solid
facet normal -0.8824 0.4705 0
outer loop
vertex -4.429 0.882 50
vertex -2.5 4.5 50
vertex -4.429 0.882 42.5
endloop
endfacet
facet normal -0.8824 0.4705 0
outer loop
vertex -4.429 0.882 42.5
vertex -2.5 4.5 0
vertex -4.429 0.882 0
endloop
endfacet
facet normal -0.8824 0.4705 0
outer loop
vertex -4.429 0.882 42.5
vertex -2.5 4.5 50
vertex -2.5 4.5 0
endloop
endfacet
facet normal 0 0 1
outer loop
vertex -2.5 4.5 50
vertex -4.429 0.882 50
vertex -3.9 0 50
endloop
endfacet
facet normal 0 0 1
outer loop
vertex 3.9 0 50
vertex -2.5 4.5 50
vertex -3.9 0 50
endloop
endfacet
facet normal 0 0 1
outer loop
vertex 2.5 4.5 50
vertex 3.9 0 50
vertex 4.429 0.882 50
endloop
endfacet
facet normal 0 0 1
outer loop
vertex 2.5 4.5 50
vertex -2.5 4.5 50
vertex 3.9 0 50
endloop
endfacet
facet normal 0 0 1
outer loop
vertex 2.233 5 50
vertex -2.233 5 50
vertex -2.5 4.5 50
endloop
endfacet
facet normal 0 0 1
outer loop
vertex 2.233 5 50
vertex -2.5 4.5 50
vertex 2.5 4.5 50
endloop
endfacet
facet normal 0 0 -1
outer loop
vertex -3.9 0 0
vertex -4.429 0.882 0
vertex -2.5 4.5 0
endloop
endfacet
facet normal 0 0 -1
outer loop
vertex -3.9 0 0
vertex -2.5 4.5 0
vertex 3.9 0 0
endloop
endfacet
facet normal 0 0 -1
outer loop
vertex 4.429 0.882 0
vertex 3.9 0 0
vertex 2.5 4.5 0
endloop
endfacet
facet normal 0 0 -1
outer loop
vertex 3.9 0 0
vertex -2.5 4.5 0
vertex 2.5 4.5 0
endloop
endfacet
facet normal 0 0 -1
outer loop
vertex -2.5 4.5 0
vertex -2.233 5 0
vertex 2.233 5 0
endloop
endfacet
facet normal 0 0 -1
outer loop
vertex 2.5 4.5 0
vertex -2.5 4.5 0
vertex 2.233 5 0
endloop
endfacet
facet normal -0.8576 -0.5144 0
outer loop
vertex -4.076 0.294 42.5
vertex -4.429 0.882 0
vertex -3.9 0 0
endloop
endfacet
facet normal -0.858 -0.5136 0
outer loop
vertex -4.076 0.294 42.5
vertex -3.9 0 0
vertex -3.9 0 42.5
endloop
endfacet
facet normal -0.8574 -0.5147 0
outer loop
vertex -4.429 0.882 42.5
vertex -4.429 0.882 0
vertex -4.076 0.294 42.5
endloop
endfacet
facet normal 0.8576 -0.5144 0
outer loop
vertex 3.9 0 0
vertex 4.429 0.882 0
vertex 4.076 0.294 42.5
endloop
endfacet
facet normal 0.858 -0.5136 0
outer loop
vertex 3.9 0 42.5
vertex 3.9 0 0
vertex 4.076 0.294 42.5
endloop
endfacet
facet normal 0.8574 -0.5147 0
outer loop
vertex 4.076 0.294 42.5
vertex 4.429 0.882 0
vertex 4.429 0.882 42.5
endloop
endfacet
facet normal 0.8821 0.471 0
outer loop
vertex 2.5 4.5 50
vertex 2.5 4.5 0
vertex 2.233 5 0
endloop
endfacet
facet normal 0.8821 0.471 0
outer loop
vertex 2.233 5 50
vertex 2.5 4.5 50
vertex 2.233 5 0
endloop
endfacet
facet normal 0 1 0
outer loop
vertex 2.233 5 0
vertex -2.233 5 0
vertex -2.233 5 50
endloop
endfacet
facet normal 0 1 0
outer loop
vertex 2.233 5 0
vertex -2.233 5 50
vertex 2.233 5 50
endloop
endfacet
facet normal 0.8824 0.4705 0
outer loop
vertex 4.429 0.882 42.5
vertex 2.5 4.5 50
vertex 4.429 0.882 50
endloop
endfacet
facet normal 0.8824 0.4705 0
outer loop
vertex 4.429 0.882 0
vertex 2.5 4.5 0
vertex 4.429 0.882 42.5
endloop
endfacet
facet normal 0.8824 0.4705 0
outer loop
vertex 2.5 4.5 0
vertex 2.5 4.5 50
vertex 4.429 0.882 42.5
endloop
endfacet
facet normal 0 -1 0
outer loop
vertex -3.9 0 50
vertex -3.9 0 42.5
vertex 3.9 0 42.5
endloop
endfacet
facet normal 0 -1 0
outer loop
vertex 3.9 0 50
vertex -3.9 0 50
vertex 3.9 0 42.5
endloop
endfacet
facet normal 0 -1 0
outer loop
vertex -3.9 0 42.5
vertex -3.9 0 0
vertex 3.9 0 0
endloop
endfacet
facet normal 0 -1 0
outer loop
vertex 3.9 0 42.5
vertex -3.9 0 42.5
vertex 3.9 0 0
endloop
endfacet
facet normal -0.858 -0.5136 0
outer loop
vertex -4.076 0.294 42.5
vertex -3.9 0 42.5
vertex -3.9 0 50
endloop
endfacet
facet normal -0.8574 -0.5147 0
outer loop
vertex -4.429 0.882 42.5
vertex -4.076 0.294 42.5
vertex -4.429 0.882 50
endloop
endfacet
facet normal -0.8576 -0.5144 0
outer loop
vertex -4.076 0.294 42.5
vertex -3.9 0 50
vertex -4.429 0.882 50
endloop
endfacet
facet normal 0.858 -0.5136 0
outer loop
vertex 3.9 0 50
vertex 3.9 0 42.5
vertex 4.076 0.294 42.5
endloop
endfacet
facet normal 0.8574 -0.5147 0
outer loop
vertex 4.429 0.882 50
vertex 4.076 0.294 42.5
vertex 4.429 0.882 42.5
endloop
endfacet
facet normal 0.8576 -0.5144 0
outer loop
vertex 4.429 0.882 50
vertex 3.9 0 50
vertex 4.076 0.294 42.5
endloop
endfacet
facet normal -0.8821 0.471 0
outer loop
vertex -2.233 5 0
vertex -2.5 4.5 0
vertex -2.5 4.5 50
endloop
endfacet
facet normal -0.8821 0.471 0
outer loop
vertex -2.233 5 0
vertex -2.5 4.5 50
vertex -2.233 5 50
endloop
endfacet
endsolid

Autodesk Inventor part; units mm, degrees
ref_plane "YZ Plane" through (0, 0, 0) normal (1, 0, 0) x (0, 1, 0)
ref_plane "XZ Plane" through (0, 0, 0) normal (0, 1, 0) x (-1, 0, 0)
ref_plane "XY Plane" through (0, 0, 0) normal (0, 0, 1) x (1, 0, 0)
sketch "Sketch1" plane through (0, 0, 0) normal (0, 0, 1) x (1, 0, 0)
  line L0 (0, 0) -> (-4.9, 0)
  line L1 (-4.9, 0) -> (4.9, 0)
  line L2 (0, 0) -> (0, 5)
  line L3 (0, 5) -> (-2.5, 5)
  line L4 (-2.5, 5) -> (-4.9, 0)
  line L5 (0, 5) -> (2.5, 5)
  line L6 (2.5, 5) -> (4.9, 0)
  line L7 (0, 0) -> (0, 4)
  line L8 (0, 4) -> (-2.5, 4)
  line L9 (-2.5, 4) -> (-4.9, 0)
  line L10 (0, 4) -> (2.5, 4)
  line L11 (2.5, 4) -> (4.9, 0)
  line L12 (0, 4) -> (0, 5)
  line L13 (0, 4.5) -> (-2.5, 4.5)
  line L14 (-2.5, 4.5) -> (-4.9, 0)
  line L15 (0, 4.5) -> (2.5, 4.5)
  line L16 (2.5, 4.5) -> (4.9, 0)
  line L17 (-4.9, 0) -> (-2.2333, 5)
  line L18 (4.9, 0) -> (2.2333, 5)
  dimension "d0" = 4.9
  dimension "d1" = 9.8
  dimension "d5" = 5
  dimension "d6" = 2.5
  dimension "d7" = 2.5
  dimension "d33" = 4
extrude "Extrusion1" add sketch "Sketch1" along normal blind 50 contours L2 L10 L11 L1 | L0 L9 L8 L2 | L14 L13 L2 L8 L9 | L11 L10 L2 L15 L16 | L17 L3 L2 L13 | L15 L2 L5 L18
sketch "Sketch2" plane through (0, 0, 50) normal (0, 0, 1) x (1, 0, 0)
  line L0 (0, 5) -> (0, -65)
  circle A0 centre (0, -30) radius 35
  line L1 (-4.9, 0) -> (4.9, 0) projected
  line L2 (4.9, 0) -> (18.0278, 0)
  arc A1 (18.0278, 0) -> (2.5, 5) centre (2.5, -21.6111) ccw
  line L3 (4.9, 0) -> (0, 0)
  line L4 (2.5, 5) -> (0, 5)
  line L5 (-4.9, 0) -> (-18.0278, 0)
  arc A2 (-2.5, 5) -> (-18.0278, 0) centre (-2.5, -21.6111) ccw
  circle A3 centre (0, -30) radius 37.5
  line L6 (2.5, 6.0566) -> (32.476, -11.25)
  line L7 (32.476, -11.25) -> (32.476, -48.75)
  line L8 (32.476, -48.75) -> (0, -67.5)
  line L9 (0, -67.5) -> (-32.476, -48.75)
  line L10 (-32.476, -48.75) -> (-32.476, -11.25)
  line L11 (-32.476, -11.25) -> (-2.5, 6.0566)
  arc A4 (2.5, 6.0566) -> (-2.5, 6.0566) centre (0, 1.7265) ccw
  line L12 (-4.9, 0) -> (-12.9904, 0)
  line L13 (4.9, 0) -> (12.9904, 0)
  line L14 (4.9, 0) -> (-4.9, 0)
  circle A5 centre (0, -30) radius 30
  line L15 (-17.488, -2.5967) -> (0, -30)
  line L16 (0, -30) -> (17.488, -2.5967)
  circle A6 centre (0, -30) radius 32.508
  line L17 (0, -30) -> (-32.476, -11.25)
  line L18 (0, -30) -> (32.476, -11.25)
  arc A7 (-29.976, -9.8066) -> (-32.476, -14.1368) centre (-27.476, -14.1368) ccw
  arc A8 (-32.476, -45.8632) -> (-29.976, -50.1934) centre (-27.476, -45.8632) ccw
  arc A9 (-2.5, -66.0566) -> (2.5, -66.0566) centre (0, -61.7265) ccw
  arc A10 (29.976, -50.1934) -> (32.476, -45.8632) centre (27.476, -45.8632) ccw
  arc A11 (32.476, -14.1368) -> (29.976, -9.8066) centre (27.476, -14.1368) ccw
  line L19 (0, -30) -> (29.976, -9.8066)
  line L20 (2.5, 4.5) -> (-2.5, 4.5) projected
  line L21 (-2.5, 4.5) -> (-4.9, 0)
  line L22 (-2.5, 4.5) -> (-4.9, 0) projected
  line L23 (-4.9, 0) -> (-1.4228, 6.5198)
  point P0 (0, 0)
  point P1 (0, 0)
  point P2 (0, 7.5)
  point P3 (16.1388, -4.7109)
  point P4 (-16.1388, -4.7109)
  point P5 (-1.8396, 6.3758)
  point P6 (25.9808, -15)
  point P7 (-32.4222, -13.4053)
  point P8 (-30.5825, -49.7811)
  point P9 (1.8396, -66.3758)
  point P10 (32.4222, -46.5947)
  point P11 (30.5825, -10.2189)
  point P12 (24.881, -13.2389)
  point P13 (29.976, -9.8066)
  point P14 (-0.9147, 6.6421)
  point P15 (0, 4.5)
  dimension "d13" = 75
  dimension "d14" = 5
  dimension "d28" = 360
extrude "Extrusion2" [suppressed]
fillet "Fillet1" [suppressed]
chamfer "Chamfer4" distance 1 angle 45 2 edges at (4.9, 0, 25) (-4.9, 0, 25)
sketch "Sketch4" plane through (0, 0, 50) normal (0, 0, 1) x (1, 0, 0)
  line L0 (-14.1632, 12.0021) -> (30.9274, 12.0021)
  line L1 (30.9274, 12.0021) -> (30.9274, -18.7889)
  line L2 (30.9274, -18.7889) -> (-14.1632, -18.7889)
  line L3 (-14.1632, -18.7889) -> (-14.1632, 12.0021)
  line L4 (-3.9, 0) -> (-4.4294, 0.8824) projected
  line L5 (-3.9, 0) -> (-4.4294, 0.8824)
  line L6 (-2.5, 4.5) -> (-4.4294, 0.8824) projected
  line L7 (-4.4294, 0.8824) -> (-2.5, 4.5)
  line L8 (2.5, 4.5) -> (-2.5, 4.5) projected
  line L9 (-2.5, 4.5) -> (2.5, 4.5)
  line L10 (-3.9, 0) -> (0, 0) projected
  line L11 (3.9, 0) -> (-3.9, 0)
  line L12 (3.9, 0) -> (4.4294, 0.8824) projected
  line L13 (3.9, 0) -> (4.4294, 0.8824)
  line L14 (4.4294, 0.8824) -> (2.5, 4.5) projected
  line L15 (4.4294, 0.8824) -> (2.5, 4.5)
  line L16 (2.2333, 5) -> (4.4294, 0.8824) projected
  line L17 (-2.2333, 5) -> (2.2333, 5) projected
  line L18 (-1.4228, 6.5198) -> (-4.4294, 0.8824) projected
extrude "Extrusion3" cut sketch "Sketch4" against normal blind 7.5
properties part number "dishHolderArm_3DPrint"
